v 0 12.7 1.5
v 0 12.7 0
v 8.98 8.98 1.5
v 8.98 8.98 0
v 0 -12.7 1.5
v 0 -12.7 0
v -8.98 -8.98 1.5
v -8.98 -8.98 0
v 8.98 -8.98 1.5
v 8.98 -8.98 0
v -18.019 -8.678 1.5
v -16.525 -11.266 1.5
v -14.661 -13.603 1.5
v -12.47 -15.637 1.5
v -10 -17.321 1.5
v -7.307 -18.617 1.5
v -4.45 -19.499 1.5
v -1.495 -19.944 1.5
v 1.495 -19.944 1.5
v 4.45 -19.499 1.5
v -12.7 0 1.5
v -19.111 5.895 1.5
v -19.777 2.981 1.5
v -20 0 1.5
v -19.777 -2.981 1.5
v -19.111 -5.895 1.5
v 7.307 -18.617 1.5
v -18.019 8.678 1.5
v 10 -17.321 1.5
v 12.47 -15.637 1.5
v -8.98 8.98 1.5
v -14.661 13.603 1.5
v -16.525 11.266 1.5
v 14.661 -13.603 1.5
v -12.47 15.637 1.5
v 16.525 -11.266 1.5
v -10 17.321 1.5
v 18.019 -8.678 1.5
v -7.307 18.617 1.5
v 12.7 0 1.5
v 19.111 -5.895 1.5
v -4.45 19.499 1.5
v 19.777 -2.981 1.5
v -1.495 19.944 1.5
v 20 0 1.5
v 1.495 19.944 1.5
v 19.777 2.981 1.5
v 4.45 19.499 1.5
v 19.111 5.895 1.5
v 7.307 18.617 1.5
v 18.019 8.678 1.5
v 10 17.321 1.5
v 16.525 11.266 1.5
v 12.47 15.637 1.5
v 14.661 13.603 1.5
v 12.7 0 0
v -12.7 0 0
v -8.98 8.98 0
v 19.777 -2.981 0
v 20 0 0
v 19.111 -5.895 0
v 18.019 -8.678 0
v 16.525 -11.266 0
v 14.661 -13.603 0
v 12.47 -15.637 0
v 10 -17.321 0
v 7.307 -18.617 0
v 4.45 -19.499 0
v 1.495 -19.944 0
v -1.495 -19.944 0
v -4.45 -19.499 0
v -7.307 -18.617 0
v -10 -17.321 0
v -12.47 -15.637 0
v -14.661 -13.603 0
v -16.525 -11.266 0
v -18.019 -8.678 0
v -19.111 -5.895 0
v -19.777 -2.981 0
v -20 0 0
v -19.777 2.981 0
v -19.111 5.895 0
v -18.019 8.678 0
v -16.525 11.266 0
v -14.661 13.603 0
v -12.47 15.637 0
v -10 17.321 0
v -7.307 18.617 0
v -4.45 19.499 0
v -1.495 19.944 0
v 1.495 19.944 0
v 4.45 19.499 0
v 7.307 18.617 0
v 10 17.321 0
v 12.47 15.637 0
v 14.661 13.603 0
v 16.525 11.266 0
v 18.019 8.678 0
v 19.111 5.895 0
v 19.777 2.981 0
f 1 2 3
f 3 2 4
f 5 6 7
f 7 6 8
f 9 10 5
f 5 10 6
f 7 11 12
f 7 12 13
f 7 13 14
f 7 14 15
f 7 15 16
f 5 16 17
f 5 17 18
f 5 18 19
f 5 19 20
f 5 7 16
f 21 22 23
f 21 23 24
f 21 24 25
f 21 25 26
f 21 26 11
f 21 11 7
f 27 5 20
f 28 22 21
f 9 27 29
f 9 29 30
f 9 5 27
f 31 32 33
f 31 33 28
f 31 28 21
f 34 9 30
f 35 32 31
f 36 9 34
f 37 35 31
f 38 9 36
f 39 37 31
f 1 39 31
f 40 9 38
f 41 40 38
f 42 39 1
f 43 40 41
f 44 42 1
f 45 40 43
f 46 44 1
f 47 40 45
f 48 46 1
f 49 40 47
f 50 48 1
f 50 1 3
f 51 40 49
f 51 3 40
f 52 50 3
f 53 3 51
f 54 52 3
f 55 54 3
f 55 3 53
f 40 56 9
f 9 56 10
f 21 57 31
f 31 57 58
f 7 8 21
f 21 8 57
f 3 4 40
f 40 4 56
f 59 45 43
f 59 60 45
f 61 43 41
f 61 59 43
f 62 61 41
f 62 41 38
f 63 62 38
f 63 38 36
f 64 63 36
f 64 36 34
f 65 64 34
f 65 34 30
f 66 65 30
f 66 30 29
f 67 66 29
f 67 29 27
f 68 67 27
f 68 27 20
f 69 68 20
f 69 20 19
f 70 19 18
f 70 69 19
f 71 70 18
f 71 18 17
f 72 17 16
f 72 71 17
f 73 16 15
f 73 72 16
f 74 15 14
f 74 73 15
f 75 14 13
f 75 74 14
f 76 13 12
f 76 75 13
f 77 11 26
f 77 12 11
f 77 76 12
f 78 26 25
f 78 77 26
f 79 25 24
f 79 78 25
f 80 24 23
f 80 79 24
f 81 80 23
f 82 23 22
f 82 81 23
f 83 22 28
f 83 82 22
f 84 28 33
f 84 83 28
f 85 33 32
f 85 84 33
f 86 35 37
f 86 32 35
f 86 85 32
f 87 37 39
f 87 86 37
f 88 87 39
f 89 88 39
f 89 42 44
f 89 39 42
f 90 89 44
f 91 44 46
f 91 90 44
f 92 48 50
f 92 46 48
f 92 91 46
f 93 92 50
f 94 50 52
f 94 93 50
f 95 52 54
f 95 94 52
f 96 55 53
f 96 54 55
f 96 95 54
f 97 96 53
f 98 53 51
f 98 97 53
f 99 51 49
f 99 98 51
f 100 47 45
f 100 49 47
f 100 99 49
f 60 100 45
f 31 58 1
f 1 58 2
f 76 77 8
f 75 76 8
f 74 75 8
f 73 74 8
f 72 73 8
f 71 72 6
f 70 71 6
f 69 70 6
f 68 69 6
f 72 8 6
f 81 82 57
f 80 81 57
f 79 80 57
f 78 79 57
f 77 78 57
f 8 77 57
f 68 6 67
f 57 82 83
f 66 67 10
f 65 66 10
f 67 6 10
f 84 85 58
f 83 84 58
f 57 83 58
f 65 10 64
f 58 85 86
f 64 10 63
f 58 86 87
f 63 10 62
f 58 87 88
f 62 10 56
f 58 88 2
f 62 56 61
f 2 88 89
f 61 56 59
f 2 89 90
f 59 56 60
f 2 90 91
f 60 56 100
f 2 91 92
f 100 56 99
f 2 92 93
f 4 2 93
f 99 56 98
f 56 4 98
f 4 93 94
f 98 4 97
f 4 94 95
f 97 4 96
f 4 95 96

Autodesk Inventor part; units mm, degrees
ref_plane "YZ Plane" through (0, 0, 0) normal (1, 0, 0) x (0, 1, 0)
ref_plane "XZ Plane" through (0, 0, 0) normal (0, 1, 0) x (-1, 0, 0)
ref_plane "XY Plane" through (0, 0, 0) normal (0, 0, 1) x (1, 0, 0)
sketch "Boceto1" plane through (0, 0, 0) normal (0, 0, 1) x (1, 0, 0)
  circle A0 centre (0, 0) radius 20
  circle A1 centre (0, 0) radius 12.7 construction
  line L0 (0, 12.7) -> (8.9803, 8.9803)
  line L1 (8.9803, 8.9803) -> (12.7, 0)
  line L2 (12.7, 0) -> (8.9803, -8.9803)
  line L3 (8.9803, -8.9803) -> (0, -12.7)
  line L4 (0, -12.7) -> (-8.9803, -8.9803)
  line L5 (-8.9803, -8.9803) -> (-12.7, 0)
  line L6 (-12.7, 0) -> (-8.9803, 8.9803)
  line L7 (-8.9803, 8.9803) -> (0, 12.7)
  dimension "d1" = 25.4
  dimension "d0" = 40
extrude "Extrusión1" add sketch "Boceto1" along normal blind 1.5
properties part number "espaciador1.5mm"
